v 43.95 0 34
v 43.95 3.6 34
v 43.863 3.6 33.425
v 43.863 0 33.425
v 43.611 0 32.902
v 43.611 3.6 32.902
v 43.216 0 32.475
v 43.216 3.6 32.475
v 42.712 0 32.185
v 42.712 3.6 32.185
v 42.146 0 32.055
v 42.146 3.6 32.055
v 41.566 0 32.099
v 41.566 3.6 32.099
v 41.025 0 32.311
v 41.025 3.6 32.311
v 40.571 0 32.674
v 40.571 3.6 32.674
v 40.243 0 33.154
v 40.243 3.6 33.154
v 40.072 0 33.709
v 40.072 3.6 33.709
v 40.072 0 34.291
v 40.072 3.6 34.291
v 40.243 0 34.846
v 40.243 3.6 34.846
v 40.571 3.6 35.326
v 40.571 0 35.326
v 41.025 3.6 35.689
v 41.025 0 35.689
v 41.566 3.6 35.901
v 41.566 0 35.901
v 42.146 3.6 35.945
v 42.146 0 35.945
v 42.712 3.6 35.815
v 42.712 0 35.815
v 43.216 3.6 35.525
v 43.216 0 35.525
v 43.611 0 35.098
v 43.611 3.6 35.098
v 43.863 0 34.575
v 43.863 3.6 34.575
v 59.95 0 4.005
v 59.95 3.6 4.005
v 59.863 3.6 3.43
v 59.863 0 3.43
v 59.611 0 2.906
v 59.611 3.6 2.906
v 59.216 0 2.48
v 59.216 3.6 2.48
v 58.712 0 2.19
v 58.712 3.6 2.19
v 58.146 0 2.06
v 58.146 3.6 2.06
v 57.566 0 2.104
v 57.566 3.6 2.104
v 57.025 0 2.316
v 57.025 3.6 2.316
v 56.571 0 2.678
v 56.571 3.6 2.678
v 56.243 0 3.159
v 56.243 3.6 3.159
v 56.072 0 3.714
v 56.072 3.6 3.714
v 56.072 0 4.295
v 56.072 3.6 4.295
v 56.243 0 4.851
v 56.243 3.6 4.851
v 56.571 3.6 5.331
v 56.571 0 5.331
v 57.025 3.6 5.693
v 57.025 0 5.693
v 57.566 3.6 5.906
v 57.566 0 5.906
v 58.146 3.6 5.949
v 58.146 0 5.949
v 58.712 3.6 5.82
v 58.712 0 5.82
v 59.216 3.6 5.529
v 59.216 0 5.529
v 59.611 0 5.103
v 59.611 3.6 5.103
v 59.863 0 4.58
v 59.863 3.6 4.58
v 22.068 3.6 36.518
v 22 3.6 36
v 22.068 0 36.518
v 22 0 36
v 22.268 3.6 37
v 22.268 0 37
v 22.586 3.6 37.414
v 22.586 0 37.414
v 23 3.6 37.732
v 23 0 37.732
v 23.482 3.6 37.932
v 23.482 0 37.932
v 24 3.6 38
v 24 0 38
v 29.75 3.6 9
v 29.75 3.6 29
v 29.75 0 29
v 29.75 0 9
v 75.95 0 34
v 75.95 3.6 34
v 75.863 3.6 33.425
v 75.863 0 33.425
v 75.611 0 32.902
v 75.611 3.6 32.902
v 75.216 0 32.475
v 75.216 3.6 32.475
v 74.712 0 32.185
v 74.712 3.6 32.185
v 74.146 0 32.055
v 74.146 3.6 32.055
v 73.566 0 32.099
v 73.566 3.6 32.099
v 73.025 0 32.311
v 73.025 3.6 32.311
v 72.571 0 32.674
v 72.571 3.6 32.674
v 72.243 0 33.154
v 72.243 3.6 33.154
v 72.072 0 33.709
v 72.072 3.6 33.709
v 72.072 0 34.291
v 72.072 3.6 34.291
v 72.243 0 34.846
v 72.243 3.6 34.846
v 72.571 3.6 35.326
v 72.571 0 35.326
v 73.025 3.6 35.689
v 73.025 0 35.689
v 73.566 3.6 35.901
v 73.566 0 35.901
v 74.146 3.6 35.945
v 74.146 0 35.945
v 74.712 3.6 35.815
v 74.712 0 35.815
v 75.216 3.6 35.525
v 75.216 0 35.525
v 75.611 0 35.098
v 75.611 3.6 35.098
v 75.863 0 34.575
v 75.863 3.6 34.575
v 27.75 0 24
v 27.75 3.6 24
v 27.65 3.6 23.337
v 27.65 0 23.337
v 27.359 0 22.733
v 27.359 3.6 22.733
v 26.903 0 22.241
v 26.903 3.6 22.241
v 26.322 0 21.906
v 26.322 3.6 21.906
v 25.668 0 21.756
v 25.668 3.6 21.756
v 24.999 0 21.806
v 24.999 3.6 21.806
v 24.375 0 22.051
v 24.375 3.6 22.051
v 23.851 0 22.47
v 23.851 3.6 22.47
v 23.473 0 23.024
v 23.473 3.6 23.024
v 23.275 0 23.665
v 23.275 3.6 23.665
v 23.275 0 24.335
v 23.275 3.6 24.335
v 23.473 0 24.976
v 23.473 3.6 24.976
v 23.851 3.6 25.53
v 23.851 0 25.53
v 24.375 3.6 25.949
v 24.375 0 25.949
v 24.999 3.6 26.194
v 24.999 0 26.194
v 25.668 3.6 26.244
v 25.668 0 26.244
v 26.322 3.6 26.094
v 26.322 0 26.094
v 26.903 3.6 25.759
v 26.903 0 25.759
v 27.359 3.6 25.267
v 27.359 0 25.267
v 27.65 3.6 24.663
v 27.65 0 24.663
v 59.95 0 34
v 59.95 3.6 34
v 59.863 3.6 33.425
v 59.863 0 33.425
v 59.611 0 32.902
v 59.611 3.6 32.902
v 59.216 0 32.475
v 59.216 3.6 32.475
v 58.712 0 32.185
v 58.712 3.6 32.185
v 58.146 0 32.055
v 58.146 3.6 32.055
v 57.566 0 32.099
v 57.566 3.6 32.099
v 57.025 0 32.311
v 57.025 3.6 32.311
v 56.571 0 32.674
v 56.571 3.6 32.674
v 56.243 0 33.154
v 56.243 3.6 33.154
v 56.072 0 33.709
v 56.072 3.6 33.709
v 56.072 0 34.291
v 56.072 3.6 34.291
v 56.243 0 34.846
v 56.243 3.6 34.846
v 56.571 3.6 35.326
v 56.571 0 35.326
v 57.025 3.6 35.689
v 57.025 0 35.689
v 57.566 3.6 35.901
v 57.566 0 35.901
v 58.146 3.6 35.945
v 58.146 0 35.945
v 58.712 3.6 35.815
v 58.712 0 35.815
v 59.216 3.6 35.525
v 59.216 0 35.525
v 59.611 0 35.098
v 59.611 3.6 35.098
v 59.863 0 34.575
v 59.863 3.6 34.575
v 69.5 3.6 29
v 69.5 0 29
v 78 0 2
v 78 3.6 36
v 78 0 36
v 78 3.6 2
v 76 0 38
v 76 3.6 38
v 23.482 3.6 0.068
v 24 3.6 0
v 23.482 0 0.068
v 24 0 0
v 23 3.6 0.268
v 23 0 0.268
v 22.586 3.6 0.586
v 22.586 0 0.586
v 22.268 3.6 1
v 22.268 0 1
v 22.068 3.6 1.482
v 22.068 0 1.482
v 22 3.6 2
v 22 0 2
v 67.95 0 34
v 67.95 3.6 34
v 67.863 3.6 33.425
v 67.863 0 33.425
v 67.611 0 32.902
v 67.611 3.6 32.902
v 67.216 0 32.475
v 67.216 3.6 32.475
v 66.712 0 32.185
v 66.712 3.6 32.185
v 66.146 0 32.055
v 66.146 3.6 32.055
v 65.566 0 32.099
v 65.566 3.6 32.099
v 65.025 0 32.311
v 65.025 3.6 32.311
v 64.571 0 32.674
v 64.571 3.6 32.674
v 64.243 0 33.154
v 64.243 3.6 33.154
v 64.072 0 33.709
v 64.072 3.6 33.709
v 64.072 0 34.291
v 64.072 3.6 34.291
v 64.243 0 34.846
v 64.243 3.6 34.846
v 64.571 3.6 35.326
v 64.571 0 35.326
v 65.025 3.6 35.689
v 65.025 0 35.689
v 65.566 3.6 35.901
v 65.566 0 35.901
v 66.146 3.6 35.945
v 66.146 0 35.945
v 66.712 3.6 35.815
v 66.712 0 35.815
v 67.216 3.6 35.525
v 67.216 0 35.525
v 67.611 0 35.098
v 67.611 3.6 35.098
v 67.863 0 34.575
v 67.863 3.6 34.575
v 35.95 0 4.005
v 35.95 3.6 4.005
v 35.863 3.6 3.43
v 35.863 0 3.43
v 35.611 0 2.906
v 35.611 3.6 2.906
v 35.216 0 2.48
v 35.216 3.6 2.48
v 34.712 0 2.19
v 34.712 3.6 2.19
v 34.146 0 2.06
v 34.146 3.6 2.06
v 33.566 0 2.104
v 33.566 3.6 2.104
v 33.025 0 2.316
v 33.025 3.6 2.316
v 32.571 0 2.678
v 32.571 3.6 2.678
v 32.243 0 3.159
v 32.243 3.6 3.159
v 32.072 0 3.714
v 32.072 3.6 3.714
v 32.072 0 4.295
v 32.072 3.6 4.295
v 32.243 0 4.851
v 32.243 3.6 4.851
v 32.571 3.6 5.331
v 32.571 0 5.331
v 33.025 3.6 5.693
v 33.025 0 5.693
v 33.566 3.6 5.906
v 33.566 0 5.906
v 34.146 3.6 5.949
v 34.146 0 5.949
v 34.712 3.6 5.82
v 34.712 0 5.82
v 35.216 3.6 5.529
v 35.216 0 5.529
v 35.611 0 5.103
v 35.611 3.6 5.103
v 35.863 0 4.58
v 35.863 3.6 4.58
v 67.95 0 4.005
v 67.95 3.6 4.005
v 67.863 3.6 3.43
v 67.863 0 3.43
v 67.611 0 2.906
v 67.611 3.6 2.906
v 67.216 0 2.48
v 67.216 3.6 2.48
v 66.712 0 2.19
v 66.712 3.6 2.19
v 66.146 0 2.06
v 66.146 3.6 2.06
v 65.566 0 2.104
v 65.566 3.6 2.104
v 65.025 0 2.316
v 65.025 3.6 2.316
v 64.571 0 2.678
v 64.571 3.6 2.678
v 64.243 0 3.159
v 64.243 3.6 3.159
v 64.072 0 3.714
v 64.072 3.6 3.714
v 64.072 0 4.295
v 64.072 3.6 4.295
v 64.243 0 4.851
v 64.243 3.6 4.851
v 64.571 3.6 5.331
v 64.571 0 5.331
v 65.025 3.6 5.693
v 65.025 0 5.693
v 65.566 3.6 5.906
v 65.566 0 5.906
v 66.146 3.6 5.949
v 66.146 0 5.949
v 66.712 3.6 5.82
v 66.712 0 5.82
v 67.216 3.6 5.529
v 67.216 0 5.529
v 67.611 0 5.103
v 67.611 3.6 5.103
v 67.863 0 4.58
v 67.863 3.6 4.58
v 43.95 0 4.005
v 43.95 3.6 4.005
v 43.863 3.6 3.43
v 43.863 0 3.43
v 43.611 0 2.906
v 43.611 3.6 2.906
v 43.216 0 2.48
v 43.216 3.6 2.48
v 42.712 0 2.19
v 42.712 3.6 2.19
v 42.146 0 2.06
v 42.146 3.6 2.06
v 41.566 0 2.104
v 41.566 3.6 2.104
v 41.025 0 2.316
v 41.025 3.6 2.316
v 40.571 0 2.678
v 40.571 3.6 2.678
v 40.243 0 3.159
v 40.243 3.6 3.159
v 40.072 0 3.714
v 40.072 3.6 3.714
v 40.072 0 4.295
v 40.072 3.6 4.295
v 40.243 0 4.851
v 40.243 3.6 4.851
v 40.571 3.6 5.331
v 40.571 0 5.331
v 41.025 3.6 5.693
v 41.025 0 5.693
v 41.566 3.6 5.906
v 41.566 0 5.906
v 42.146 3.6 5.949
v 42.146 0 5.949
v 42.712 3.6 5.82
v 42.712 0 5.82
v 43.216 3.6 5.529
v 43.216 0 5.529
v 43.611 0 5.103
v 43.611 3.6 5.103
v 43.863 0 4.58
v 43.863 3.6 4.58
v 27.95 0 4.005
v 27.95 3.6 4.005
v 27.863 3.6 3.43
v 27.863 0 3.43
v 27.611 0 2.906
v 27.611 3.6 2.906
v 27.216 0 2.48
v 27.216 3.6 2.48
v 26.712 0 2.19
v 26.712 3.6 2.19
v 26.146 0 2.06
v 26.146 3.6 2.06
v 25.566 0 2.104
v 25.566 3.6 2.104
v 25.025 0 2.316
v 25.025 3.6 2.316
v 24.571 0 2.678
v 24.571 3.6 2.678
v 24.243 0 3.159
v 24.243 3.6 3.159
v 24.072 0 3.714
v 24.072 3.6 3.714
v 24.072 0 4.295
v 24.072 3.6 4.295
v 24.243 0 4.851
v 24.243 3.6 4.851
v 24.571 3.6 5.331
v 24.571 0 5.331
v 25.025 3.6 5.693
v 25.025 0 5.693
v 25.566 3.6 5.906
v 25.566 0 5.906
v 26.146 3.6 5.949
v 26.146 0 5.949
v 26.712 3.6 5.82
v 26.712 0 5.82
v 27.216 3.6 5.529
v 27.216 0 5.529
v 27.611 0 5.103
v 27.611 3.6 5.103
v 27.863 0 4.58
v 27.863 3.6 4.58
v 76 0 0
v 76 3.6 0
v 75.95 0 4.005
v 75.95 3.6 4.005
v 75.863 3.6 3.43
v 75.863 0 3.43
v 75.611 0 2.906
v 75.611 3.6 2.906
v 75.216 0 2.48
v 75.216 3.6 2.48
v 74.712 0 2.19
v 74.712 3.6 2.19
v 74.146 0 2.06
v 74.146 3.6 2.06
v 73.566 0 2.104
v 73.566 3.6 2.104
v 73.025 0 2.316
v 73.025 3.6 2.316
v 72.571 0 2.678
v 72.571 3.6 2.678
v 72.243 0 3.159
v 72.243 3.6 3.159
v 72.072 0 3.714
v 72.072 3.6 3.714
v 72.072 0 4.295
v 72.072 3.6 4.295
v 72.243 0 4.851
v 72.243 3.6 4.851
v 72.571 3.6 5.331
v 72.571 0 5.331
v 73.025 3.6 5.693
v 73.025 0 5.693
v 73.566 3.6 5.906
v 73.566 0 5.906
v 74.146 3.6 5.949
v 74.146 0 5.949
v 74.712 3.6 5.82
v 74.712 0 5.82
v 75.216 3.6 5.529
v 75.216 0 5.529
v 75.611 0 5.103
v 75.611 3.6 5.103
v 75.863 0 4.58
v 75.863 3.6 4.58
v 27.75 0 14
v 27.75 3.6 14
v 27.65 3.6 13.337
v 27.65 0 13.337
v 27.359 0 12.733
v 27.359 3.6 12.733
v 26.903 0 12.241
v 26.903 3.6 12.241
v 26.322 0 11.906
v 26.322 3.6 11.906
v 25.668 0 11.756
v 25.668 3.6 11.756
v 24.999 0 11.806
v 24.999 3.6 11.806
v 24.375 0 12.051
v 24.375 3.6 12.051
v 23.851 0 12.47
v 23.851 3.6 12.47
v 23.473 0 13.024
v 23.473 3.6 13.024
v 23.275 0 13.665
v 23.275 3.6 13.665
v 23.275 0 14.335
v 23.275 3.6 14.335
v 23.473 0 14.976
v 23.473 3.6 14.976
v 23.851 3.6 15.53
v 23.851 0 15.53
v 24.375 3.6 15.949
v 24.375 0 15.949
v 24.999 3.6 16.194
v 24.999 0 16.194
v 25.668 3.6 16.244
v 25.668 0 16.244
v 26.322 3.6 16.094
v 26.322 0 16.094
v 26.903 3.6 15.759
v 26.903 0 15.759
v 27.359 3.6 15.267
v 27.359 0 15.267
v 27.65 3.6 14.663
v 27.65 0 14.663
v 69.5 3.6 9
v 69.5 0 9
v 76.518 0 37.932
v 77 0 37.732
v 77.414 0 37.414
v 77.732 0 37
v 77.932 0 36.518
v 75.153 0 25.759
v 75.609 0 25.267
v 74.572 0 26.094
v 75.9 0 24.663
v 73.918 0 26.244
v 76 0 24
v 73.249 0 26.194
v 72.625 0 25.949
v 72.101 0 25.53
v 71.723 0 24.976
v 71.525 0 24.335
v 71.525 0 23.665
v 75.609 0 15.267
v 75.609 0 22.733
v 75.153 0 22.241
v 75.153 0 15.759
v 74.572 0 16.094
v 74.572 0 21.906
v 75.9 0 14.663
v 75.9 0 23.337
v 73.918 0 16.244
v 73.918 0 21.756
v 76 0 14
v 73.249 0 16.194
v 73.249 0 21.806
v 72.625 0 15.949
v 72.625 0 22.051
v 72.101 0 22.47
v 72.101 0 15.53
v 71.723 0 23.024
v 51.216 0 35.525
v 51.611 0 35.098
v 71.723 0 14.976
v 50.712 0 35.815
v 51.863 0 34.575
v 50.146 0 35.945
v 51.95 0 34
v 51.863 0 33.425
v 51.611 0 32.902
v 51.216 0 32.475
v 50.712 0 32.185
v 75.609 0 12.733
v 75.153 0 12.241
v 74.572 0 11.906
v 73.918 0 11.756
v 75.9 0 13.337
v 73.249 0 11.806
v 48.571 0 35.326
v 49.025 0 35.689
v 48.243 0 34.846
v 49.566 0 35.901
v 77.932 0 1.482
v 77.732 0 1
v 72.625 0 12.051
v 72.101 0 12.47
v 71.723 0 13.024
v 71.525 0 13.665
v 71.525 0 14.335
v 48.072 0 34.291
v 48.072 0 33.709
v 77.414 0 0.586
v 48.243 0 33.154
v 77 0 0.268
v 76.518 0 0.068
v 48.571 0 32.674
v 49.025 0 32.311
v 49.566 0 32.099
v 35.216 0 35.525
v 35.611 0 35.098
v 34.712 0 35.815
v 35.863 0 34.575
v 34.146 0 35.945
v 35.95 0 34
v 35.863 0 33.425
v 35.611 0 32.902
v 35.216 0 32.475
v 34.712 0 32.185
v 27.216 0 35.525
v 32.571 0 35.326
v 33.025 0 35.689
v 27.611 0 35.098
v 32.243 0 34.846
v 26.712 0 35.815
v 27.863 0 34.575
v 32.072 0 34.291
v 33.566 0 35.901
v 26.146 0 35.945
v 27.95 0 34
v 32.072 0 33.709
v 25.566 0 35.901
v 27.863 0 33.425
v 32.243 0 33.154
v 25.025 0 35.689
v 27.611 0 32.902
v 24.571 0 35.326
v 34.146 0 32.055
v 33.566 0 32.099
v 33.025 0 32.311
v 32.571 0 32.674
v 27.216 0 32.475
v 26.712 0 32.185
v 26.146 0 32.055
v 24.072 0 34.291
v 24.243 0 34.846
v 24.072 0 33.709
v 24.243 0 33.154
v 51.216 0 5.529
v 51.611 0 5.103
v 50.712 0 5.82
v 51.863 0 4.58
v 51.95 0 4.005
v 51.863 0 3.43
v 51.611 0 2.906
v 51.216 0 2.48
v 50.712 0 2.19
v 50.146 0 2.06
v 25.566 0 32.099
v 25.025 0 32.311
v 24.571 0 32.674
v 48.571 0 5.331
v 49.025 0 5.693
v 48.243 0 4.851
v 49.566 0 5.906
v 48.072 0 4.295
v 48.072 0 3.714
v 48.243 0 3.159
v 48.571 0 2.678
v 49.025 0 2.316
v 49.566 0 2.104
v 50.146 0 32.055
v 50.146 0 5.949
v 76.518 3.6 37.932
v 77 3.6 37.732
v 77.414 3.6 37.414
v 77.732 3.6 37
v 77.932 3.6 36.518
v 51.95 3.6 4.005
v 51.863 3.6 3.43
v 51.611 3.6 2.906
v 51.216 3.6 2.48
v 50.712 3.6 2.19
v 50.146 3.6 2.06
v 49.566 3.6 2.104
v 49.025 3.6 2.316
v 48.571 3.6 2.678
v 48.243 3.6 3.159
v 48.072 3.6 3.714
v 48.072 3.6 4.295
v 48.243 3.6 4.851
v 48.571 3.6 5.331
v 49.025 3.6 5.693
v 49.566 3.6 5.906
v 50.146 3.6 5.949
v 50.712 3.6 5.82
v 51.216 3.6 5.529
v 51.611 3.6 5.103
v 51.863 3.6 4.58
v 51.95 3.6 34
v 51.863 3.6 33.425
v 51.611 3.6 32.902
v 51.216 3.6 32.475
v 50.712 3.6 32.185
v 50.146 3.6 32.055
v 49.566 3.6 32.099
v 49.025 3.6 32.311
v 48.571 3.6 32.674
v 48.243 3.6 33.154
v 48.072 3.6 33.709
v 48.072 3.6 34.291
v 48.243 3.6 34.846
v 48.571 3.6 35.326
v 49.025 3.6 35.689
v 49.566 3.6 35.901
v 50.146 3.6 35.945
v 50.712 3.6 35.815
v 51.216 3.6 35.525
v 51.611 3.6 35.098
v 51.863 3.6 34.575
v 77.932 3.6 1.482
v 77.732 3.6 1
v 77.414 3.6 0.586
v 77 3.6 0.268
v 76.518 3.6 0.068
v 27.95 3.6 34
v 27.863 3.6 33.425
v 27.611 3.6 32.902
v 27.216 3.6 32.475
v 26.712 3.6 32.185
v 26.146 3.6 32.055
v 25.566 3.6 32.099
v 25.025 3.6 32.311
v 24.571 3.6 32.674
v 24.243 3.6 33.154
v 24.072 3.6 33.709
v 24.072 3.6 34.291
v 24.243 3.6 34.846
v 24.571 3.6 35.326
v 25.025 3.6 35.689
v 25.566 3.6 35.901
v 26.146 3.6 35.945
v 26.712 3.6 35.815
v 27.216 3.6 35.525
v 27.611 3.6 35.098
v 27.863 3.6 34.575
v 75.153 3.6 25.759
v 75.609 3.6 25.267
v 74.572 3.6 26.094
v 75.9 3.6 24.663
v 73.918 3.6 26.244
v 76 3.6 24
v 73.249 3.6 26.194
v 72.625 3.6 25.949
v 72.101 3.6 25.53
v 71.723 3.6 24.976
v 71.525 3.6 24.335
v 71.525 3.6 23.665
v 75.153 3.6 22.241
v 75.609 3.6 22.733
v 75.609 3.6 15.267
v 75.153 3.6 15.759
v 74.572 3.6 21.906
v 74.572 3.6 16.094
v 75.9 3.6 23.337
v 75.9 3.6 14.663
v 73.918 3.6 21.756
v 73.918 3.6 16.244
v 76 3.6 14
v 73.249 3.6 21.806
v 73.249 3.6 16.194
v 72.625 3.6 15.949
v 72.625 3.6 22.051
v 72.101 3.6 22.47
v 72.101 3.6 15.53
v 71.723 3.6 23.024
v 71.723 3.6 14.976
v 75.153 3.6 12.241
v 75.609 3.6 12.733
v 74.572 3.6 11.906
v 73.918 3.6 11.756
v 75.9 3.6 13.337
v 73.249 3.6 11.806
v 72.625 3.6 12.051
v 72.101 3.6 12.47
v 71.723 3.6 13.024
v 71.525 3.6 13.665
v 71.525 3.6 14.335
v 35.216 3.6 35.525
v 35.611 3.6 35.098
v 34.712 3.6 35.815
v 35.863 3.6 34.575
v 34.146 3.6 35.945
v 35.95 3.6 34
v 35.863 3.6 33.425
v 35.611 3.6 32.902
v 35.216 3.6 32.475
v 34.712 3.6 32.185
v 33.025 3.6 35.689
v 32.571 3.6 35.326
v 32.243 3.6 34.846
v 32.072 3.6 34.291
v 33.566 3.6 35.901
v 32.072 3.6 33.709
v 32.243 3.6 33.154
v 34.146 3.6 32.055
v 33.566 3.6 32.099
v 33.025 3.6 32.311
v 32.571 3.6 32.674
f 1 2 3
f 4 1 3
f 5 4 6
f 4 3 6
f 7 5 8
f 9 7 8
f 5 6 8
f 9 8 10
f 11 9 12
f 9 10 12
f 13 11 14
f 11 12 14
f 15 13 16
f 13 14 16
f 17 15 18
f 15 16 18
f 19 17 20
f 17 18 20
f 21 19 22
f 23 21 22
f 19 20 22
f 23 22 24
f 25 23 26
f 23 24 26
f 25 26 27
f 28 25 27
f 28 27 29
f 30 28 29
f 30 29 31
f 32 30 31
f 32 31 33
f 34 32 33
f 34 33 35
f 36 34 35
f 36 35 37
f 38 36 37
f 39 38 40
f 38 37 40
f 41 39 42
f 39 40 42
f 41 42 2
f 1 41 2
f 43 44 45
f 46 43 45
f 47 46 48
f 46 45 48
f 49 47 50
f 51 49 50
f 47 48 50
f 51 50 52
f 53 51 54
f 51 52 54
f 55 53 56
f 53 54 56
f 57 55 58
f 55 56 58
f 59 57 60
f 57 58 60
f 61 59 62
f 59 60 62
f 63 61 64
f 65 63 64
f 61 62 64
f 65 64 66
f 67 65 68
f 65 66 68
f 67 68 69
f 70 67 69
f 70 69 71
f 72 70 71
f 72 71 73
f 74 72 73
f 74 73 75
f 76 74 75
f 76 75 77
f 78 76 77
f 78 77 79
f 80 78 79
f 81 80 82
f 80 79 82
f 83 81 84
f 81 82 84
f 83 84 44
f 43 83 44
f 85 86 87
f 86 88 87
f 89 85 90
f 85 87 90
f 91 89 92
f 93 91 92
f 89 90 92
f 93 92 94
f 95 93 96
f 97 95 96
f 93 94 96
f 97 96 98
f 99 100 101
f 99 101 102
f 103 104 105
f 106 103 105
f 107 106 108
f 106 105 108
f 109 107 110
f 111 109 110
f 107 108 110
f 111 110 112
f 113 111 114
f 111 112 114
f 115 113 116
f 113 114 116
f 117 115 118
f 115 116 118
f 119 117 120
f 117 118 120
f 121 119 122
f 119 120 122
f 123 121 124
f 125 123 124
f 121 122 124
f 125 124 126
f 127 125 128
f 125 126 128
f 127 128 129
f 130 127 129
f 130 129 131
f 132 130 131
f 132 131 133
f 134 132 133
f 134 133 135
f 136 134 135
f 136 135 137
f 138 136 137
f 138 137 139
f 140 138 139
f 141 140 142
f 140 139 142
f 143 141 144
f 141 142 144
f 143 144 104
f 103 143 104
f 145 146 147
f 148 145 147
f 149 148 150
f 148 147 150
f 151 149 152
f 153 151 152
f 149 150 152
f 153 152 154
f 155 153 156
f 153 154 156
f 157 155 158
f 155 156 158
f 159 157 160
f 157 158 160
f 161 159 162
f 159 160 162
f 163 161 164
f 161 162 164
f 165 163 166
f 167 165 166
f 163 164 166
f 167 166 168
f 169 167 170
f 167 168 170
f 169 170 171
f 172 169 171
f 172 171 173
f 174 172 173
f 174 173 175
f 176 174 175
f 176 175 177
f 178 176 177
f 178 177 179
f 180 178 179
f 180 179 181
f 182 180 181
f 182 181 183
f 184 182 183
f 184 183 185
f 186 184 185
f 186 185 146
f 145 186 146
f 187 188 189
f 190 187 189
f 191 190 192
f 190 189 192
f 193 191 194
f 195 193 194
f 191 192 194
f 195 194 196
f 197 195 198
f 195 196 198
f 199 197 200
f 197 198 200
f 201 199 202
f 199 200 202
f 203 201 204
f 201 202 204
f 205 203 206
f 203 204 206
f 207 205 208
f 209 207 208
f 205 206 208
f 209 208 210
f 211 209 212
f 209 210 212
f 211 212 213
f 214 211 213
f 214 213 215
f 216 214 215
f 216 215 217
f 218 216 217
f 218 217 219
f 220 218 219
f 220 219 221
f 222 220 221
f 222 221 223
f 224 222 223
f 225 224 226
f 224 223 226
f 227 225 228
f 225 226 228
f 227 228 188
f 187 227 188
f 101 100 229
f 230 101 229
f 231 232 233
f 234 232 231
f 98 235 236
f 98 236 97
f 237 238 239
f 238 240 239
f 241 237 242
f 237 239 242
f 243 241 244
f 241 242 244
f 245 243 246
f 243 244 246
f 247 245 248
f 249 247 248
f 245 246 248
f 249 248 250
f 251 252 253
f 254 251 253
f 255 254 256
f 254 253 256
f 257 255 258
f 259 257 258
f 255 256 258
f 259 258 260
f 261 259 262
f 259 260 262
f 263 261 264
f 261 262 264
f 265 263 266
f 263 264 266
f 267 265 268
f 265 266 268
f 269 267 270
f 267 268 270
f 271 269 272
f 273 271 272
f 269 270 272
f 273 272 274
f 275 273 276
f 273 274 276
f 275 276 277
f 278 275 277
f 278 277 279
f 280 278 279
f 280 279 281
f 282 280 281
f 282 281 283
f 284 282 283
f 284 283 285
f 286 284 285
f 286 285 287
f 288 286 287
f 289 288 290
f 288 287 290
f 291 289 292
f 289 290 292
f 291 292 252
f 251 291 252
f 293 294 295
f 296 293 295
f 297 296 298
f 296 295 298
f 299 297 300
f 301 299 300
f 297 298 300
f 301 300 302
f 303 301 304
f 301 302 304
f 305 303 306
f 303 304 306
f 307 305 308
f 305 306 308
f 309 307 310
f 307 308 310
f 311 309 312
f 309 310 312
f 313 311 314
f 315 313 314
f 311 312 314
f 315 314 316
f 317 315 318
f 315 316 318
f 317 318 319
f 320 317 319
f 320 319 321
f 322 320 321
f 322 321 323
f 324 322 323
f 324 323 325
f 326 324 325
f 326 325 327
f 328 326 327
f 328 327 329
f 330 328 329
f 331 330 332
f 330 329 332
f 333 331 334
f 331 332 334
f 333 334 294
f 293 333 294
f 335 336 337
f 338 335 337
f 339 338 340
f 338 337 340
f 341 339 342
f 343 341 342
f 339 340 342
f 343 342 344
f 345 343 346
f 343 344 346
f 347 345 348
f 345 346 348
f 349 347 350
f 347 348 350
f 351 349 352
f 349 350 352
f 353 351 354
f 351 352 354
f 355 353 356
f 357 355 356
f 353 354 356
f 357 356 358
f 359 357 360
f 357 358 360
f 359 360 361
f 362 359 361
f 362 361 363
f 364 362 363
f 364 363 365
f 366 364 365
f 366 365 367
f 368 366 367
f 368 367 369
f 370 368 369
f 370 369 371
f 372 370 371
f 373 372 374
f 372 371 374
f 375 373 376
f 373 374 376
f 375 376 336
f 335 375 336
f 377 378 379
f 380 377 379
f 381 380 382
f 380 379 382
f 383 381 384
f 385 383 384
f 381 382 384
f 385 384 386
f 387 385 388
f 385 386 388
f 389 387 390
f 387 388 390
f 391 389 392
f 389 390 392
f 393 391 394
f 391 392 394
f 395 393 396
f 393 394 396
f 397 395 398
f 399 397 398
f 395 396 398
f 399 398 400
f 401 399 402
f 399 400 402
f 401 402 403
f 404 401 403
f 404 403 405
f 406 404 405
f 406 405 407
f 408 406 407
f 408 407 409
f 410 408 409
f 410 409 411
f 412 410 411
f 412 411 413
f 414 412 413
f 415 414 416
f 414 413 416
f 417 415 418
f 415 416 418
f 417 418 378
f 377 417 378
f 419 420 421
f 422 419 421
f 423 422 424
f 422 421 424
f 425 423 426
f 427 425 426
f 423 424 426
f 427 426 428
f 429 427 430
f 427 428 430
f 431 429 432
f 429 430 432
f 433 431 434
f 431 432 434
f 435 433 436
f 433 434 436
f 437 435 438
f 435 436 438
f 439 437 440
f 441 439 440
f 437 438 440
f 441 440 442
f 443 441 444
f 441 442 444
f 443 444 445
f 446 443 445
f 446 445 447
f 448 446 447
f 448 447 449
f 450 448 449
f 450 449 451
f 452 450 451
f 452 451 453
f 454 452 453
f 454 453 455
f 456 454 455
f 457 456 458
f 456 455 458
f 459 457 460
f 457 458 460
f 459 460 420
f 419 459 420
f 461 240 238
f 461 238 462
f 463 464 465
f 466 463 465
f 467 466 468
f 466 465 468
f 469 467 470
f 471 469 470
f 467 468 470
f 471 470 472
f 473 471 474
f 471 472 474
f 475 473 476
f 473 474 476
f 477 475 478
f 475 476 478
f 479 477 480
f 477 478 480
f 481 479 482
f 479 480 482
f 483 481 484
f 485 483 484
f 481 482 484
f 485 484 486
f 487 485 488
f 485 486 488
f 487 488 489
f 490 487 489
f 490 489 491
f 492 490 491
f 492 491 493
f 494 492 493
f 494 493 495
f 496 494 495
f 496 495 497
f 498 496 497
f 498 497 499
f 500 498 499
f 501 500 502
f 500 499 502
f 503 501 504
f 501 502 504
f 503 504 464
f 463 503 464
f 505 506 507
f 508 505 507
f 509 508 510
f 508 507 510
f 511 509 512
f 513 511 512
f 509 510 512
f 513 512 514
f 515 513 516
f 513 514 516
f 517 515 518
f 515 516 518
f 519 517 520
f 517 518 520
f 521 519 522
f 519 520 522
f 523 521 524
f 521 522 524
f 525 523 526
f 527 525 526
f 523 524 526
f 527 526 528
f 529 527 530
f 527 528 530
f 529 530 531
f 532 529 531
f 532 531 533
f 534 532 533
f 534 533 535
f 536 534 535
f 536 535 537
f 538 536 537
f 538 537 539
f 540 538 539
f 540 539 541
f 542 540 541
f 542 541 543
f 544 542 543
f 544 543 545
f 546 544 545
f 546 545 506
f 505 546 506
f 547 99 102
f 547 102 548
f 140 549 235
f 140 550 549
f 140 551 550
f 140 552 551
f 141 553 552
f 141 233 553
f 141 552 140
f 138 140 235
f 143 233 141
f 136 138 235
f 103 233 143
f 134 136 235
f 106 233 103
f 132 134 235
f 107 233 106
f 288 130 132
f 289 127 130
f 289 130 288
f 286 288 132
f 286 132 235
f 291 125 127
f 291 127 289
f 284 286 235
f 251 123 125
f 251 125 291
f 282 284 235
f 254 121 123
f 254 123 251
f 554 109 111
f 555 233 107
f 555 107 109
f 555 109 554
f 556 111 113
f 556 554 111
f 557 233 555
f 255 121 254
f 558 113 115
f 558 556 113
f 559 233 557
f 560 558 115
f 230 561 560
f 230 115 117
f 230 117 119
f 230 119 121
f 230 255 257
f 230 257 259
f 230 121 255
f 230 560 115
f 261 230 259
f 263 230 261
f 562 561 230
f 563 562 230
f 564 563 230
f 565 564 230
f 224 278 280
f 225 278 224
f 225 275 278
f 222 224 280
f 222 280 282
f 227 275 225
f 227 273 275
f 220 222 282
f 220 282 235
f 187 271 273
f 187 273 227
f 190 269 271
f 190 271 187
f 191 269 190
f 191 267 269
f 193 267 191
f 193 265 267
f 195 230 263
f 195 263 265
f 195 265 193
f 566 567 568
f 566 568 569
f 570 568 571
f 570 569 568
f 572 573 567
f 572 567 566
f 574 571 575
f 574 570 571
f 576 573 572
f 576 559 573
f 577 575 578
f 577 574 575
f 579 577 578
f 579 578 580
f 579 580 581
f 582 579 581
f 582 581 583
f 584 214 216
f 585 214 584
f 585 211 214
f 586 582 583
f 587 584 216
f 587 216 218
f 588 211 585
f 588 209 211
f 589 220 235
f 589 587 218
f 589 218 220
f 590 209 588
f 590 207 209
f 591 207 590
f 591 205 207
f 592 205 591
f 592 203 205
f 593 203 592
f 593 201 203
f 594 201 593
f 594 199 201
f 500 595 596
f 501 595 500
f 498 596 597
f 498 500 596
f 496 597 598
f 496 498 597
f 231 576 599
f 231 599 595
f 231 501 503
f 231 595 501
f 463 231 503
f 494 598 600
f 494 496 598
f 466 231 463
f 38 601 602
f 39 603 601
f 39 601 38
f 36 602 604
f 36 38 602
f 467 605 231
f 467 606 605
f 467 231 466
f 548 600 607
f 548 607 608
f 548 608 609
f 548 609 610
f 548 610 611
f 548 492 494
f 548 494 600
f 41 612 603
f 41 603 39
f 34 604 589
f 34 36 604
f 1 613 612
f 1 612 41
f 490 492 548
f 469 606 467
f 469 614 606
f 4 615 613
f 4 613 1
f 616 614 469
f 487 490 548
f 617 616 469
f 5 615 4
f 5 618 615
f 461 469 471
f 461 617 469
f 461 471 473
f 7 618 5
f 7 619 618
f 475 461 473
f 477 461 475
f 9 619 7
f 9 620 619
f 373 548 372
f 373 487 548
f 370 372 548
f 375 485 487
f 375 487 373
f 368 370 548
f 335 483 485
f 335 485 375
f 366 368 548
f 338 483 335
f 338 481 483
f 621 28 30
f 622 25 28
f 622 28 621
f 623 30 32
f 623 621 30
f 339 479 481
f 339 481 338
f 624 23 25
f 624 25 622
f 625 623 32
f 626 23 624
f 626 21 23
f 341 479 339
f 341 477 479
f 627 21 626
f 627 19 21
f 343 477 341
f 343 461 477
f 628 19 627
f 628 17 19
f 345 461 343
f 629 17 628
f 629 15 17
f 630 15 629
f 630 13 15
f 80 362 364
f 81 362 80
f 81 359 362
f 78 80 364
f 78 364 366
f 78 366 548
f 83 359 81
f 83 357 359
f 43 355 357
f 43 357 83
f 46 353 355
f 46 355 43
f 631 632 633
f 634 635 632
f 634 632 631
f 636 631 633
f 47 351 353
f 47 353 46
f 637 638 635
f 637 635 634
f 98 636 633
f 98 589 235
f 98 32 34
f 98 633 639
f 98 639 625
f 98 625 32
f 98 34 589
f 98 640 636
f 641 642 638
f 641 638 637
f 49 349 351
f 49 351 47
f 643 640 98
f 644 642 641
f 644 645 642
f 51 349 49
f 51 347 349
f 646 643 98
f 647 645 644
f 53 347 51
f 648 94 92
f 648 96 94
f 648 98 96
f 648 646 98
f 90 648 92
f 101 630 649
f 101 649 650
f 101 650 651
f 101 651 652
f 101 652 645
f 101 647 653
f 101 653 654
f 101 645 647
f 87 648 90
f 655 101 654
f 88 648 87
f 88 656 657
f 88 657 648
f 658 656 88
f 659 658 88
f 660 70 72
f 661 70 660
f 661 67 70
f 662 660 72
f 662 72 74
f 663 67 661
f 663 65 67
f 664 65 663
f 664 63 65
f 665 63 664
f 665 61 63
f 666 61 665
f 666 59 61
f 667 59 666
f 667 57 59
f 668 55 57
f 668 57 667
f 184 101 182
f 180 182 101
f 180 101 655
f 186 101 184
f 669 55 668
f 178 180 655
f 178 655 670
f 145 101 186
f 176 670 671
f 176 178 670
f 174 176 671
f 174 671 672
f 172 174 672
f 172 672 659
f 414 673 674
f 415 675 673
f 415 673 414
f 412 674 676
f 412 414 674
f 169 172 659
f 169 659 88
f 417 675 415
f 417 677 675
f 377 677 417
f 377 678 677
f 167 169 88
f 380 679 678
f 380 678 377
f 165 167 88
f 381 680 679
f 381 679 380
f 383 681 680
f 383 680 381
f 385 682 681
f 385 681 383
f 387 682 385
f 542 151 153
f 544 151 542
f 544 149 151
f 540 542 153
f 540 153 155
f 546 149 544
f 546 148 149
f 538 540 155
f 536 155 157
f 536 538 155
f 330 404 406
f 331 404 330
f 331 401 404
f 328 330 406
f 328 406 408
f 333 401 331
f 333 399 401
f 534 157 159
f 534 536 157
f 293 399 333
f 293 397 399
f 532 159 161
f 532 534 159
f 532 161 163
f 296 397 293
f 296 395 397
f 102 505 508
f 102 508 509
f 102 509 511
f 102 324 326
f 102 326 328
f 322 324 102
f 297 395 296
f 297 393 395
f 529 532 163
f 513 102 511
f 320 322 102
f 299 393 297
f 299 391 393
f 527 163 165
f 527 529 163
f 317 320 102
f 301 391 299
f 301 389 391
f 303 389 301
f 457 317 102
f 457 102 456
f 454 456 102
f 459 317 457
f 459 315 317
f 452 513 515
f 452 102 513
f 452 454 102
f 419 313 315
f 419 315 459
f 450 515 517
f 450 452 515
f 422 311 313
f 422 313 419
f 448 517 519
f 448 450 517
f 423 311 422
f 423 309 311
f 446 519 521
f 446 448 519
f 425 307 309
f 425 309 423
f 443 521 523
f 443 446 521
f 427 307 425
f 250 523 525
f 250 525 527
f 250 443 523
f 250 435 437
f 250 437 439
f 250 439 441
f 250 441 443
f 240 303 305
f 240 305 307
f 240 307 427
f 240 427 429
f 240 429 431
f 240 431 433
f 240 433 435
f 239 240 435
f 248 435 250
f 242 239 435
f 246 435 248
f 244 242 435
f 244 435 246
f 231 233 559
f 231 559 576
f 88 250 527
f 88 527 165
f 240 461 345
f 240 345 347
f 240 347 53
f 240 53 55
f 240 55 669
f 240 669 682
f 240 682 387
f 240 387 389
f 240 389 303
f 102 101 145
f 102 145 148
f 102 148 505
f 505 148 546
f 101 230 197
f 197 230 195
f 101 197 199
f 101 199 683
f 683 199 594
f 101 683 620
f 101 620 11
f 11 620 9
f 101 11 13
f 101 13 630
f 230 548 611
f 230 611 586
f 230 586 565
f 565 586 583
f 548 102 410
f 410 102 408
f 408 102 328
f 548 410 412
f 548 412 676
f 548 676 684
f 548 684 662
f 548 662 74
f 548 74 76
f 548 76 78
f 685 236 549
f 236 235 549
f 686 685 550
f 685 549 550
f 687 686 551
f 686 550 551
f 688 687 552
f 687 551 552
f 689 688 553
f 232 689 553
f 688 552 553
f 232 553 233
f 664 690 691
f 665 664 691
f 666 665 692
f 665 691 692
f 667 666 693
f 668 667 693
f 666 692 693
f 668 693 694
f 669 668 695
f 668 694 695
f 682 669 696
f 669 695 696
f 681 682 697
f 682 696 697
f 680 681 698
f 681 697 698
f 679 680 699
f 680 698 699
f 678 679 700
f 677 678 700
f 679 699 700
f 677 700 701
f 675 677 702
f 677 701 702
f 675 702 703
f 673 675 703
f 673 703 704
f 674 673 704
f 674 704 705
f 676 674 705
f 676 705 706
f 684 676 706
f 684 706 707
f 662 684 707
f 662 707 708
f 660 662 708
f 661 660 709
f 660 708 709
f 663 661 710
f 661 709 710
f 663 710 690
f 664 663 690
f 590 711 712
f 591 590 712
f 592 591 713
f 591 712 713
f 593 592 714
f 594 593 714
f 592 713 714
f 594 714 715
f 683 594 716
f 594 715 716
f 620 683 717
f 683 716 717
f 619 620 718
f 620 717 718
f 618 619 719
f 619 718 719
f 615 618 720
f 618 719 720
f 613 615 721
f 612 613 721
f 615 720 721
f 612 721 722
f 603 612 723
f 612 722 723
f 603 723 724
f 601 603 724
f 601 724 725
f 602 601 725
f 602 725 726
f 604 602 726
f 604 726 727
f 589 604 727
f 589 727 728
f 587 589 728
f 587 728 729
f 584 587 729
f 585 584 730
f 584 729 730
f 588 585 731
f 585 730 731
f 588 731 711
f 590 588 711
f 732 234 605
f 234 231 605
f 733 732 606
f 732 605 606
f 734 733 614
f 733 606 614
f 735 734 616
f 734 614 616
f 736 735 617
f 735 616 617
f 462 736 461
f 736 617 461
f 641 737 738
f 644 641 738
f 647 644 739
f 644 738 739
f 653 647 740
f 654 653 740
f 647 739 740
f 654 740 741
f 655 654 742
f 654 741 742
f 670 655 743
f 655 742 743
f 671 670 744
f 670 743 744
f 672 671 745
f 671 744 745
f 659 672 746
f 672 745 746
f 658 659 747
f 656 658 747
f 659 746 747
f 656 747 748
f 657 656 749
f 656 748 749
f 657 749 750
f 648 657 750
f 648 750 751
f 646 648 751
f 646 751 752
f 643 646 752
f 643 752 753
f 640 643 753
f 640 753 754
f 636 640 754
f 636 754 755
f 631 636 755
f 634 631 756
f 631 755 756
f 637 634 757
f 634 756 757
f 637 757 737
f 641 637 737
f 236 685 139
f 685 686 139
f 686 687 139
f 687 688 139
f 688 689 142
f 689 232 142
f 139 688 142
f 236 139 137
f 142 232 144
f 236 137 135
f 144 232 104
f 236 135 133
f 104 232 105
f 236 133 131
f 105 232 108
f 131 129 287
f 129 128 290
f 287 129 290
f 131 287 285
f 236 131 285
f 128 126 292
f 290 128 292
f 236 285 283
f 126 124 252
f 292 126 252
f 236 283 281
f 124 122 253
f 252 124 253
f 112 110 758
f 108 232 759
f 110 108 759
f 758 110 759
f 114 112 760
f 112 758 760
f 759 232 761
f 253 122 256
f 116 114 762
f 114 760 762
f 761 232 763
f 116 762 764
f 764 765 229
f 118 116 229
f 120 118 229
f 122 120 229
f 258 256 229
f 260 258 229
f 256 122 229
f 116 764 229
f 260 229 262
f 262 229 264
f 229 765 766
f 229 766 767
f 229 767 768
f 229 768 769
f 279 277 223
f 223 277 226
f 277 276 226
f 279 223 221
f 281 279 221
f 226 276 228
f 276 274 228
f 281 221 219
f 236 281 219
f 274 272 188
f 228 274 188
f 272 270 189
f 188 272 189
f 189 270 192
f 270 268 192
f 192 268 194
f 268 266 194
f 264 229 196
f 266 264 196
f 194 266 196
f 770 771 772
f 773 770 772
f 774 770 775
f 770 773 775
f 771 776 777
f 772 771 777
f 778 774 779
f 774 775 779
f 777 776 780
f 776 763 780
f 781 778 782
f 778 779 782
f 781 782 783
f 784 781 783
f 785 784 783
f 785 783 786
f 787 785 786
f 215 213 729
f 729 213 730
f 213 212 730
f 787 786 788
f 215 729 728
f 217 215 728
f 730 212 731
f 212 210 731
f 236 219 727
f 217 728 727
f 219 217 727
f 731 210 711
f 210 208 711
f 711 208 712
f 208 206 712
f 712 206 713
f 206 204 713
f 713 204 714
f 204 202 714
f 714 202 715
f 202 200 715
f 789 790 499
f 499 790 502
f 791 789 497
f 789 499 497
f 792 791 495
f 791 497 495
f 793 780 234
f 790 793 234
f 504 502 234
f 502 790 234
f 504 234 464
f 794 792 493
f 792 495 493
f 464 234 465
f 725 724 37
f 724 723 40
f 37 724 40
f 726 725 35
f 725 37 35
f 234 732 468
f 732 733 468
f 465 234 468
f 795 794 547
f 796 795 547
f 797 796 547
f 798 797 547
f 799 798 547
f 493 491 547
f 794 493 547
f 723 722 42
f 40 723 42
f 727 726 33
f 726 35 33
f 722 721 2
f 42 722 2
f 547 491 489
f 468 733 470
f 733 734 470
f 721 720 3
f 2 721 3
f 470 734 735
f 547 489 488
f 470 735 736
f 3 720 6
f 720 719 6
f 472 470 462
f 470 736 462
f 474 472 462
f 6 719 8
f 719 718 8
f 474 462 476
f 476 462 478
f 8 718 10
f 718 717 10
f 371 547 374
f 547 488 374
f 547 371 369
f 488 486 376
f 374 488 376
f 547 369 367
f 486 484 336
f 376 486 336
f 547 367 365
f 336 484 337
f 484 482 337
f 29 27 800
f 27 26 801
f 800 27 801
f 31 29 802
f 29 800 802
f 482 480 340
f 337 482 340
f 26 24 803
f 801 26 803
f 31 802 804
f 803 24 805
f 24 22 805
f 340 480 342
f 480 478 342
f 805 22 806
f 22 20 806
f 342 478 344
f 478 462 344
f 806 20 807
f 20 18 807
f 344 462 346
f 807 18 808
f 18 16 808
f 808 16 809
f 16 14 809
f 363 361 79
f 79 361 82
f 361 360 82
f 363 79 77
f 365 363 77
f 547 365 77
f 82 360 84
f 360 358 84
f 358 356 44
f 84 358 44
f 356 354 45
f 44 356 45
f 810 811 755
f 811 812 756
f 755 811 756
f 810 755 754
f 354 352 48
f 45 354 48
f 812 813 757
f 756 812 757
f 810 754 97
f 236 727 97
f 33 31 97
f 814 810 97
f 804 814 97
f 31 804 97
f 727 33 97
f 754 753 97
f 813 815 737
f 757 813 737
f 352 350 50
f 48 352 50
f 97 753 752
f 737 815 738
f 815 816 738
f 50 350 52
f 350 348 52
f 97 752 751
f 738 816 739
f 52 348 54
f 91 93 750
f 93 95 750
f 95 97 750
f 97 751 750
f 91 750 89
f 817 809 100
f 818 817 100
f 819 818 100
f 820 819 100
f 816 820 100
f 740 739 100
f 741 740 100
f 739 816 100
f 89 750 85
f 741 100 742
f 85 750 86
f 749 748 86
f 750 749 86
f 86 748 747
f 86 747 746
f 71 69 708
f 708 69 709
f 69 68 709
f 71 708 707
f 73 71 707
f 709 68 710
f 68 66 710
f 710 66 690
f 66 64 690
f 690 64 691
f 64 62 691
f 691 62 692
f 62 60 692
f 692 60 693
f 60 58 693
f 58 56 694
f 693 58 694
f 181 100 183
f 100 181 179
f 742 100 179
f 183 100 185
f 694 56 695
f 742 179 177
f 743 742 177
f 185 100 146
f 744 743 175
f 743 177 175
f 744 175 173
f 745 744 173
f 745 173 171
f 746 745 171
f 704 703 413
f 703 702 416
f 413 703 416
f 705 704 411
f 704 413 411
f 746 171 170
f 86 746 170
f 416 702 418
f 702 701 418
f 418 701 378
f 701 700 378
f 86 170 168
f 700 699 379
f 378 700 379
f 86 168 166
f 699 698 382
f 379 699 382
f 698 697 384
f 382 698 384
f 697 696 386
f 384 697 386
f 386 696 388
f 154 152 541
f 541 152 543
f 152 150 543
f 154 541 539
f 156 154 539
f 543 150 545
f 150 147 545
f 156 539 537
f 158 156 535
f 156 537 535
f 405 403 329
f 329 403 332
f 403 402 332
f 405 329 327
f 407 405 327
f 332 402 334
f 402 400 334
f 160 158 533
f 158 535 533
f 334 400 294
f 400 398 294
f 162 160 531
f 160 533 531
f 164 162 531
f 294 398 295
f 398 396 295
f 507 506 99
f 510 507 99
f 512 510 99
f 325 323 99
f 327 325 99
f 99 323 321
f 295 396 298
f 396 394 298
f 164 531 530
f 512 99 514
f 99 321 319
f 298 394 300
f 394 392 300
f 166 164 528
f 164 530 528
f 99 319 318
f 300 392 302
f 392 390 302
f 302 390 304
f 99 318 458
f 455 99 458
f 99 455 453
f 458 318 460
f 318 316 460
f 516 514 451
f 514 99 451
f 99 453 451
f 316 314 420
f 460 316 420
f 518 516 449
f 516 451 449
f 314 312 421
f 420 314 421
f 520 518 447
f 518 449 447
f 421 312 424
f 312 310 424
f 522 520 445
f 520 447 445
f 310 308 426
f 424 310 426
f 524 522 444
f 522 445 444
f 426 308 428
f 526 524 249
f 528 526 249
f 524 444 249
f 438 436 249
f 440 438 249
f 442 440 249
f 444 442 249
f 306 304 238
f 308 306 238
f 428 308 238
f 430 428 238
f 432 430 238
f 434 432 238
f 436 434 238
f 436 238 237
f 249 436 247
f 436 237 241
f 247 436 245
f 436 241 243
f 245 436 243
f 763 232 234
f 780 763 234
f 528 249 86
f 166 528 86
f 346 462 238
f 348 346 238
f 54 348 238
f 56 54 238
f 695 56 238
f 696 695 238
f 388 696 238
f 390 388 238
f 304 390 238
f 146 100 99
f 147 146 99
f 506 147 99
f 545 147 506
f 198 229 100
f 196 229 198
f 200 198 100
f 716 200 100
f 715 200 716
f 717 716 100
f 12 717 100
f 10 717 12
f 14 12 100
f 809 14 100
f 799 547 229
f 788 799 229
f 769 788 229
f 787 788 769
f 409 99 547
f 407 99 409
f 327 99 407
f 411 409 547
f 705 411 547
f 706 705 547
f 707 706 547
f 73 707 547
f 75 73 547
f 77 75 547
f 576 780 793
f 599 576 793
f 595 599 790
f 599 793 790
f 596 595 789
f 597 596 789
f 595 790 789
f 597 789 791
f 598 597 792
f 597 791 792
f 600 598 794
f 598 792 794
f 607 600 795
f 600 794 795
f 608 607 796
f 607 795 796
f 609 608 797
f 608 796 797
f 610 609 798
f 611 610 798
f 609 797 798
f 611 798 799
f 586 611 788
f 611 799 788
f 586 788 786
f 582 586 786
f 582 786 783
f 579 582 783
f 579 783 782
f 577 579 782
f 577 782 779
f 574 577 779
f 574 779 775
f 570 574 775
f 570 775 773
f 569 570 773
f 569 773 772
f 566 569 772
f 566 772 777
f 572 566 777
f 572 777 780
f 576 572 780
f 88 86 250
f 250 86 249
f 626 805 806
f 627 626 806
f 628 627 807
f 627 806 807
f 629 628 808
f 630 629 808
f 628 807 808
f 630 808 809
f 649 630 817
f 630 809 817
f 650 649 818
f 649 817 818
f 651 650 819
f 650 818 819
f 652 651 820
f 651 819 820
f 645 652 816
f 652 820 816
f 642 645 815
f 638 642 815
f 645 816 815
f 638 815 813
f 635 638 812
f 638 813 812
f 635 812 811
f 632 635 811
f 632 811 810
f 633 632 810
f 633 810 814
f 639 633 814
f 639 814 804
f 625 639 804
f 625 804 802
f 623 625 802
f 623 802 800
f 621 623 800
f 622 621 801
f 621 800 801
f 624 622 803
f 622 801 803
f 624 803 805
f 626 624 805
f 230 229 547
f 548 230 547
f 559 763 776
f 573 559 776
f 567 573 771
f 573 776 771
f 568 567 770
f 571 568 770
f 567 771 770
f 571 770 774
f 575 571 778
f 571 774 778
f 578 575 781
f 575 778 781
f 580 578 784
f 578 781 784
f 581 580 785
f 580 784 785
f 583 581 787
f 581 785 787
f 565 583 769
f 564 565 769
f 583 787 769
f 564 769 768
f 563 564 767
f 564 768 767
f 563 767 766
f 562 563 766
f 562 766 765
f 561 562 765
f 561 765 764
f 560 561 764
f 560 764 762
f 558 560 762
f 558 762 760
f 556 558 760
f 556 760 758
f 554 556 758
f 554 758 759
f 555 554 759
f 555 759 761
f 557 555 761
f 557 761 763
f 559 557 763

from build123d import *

# Parameters (mm, degrees)
BOSS_EXTRUDE1_DEPTH = 3.6
SKETCH2_R           = 1.95
SKETCH2_W           = 39.75
SKETCH2_H           = 20
CUT_EXTRUDE1_DEPTH  = 3.6
SKETCH4_W           = 22
SKETCH4_H           = 38
CUT_EXTRUDE2_DEPTH  = 10
FILLET1_R           = 2
FILLET2_R           = 2
FILLET3_R           = 2
FILLET4_R           = 2
SKETCH5_R           = 2.25
CUT_EXTRUDE3_DEPTH  = 10


with BuildPart() as part:
    # Sketch1 → Boss-Extrude1 (new body)
    with BuildSketch(Plane(origin=(0, 0, 0), x_dir=(1, 0, 0), z_dir=(0, 1, 0))):
        with BuildLine():
            Line((2, 0), (98, 0))
            ThreePointArc((98, 0), (99.414213562, -0.585786438), (100, -2))
            Line((100, -2), (100, -36))
            ThreePointArc((100, -36), (99.414213562, -37.414213562), (98, -38))
            Line((98, -38), (2, -38))
            ThreePointArc((2, -38), (0.585786438, -37.414213562), (0, -36))
            Line((0, -36), (0, -2))
            ThreePointArc((0, -2), (0.585786438, -0.585786438), (2, 0))
        make_face()
    extrude(amount=BOSS_EXTRUDE1_DEPTH)

    # Sketch2 → Cut-Extrude1 (cut)
    with BuildSketch(Plane(origin=(0, 3.6, 0), x_dir=(1, 0, 0), z_dir=(0, 1, 0))):
        with Locations((90, -4.00475022)):
            Circle(SKETCH2_R)
        with Locations((82, -4.00475022)):
            Circle(SKETCH2_R)
        with Locations((18, -4.00475022)):
            Circle(SKETCH2_R)
        with Locations((26, -4.00475022)):
            Circle(SKETCH2_R)
        with Locations((34, -4.00475022)):
            Circle(SKETCH2_R)
        with Locations((42, -4.00475022)):
            Circle(SKETCH2_R)
        with Locations((50, -4.00475022)):
            Circle(SKETCH2_R)
        with Locations((58, -4.00475022)):
            Circle(SKETCH2_R)
        with Locations((66, -4.00475022)):
            Circle(SKETCH2_R)
        with Locations((74, -4.00475022)):
            Circle(SKETCH2_R)
        with Locations((90, -34)):
            Circle(SKETCH2_R)
        with Locations((82, -34)):
            Circle(SKETCH2_R)
        with Locations((18, -34)):
            Circle(SKETCH2_R)
        with Locations((26, -34)):
            Circle(SKETCH2_R)
        with Locations((34, -34)):
            Circle(SKETCH2_R)
        with Locations((42, -34)):
            Circle(SKETCH2_R)
        with Locations((50, -34)):
            Circle(SKETCH2_R)
        with Locations((58, -34)):
            Circle(SKETCH2_R)
        with Locations((66, -34)):
            Circle(SKETCH2_R)
        with Locations((74, -34)):
            Circle(SKETCH2_R)
        with Locations((49.625, -19)):
            Rectangle(SKETCH2_W, SKETCH2_H)
    extrude(amount=-CUT_EXTRUDE1_DEPTH, mode=Mode.SUBTRACT)

    # Sketch4 → Cut-Extrude2 (cut)
    with BuildSketch(Plane(origin=(0, 3.6, 0), x_dir=(1, 0, 0), z_dir=(0, 1, 0))):
        with Locations((89, -19)):
            Rectangle(SKETCH4_W, SKETCH4_H)
        with Locations((11, -19)):
            Rectangle(SKETCH4_W, SKETCH4_H)
    extrude(amount=-CUT_EXTRUDE2_DEPTH, mode=Mode.SUBTRACT)

    # Fillet1
    fillet1_edges = [part.edges().sort_by_distance(p)[0] for p in [
        (22, 1.8, 0),
    ]]
    fillet(fillet1_edges, radius=FILLET1_R)

    # Fillet2
    fillet2_edges = [part.edges().sort_by_distance(p)[0] for p in [
        (22, 1.8, 38),
    ]]
    fillet(fillet2_edges, radius=FILLET2_R)

    # Fillet3
    fillet3_edges = [part.edges().sort_by_distance(p)[0] for p in [
        (78, 1.8, 38),
    ]]
    fillet(fillet3_edges, radius=FILLET3_R)

    # Fillet4
    fillet4_edges = [part.edges().sort_by_distance(p)[0] for p in [
        (78, 1.8, 0),
    ]]
    fillet(fillet4_edges, radius=FILLET4_R)

    # Sketch5 → Cut-Extrude3 (cut)
    with BuildSketch(Plane(origin=(0, 3.6, 0), x_dir=(1, 0, 0), z_dir=(0, 1, 0))):
        with Locations((73.75, -14)):
            Circle(SKETCH5_R)
        with Locations((73.75, -24)):
            Circle(SKETCH5_R)
        with Locations((25.5, -14)):
            Circle(SKETCH5_R)
        with Locations((25.5, -24)):
            Circle(SKETCH5_R)
    extrude(amount=-CUT_EXTRUDE3_DEPTH, mode=Mode.SUBTRACT)


solid = part.part
